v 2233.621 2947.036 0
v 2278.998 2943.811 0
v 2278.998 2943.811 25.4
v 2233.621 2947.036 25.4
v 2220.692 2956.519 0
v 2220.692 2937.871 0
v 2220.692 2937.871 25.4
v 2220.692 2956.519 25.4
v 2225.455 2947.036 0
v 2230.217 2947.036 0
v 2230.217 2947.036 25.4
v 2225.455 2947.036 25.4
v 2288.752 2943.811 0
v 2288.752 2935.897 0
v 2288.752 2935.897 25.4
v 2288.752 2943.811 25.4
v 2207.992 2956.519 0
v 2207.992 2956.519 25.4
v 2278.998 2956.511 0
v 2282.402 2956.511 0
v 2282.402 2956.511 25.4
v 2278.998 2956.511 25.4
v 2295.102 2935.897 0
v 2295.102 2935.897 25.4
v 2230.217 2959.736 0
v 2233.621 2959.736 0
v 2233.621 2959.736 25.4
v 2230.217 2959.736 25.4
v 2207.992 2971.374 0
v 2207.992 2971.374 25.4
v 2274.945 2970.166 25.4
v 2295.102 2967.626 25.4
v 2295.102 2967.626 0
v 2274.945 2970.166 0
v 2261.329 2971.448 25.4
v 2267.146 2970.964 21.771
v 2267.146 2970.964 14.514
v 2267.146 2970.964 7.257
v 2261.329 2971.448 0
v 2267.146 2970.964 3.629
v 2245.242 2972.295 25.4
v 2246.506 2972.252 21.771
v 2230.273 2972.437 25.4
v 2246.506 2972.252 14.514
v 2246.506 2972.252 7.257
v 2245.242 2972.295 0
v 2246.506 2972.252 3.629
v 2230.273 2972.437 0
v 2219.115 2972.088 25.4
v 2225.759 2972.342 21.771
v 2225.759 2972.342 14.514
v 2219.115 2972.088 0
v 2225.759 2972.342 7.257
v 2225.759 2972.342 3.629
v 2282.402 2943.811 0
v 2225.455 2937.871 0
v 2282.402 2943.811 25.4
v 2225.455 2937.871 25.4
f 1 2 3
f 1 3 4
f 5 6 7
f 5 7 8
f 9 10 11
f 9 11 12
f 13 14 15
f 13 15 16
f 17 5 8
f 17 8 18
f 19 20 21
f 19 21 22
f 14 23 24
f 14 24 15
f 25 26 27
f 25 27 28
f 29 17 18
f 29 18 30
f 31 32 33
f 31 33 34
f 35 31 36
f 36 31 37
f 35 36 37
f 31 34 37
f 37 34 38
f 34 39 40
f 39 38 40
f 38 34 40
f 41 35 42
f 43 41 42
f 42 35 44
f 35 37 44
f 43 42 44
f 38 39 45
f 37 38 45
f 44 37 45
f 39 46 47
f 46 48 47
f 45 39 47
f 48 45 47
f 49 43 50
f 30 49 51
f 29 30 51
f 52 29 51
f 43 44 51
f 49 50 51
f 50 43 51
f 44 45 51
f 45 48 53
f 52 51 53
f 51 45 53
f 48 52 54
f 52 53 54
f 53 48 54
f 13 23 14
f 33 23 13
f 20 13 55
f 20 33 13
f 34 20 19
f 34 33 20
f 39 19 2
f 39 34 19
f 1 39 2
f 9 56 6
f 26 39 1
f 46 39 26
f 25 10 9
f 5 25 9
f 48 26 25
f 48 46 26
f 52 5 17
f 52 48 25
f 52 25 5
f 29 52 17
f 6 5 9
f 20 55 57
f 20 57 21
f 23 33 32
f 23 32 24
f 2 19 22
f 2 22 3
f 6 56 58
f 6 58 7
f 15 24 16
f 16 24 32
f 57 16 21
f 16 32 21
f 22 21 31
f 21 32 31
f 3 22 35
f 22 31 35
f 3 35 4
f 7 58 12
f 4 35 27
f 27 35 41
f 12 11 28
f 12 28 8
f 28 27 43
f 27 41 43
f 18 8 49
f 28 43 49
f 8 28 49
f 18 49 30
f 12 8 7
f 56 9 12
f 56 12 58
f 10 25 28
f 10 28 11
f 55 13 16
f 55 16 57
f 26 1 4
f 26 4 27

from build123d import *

# Parameters (mm, degrees)
BOSS_EXTRUDE1_DEPTH = 25.4


with BuildPart() as part:
    # Sketch1 → Boss-Extrude1 (new body)
    with BuildSketch(Plane.XY):
        with BuildLine():
            Line((2220.692415066, 2956.519458786), (2207.992415066, 2956.519458786))
            Line((2207.992415066, 2956.519458786), (2207.992415066, 2971.373508056))
            add(Edge.make_bspline(
                [(2295.101715066, 2967.625549053), (2290.064424466, 2968.346081243), (2285.012310956, 2969.008222259), (2275.661688407, 2970.095859332), (2271.46891104, 2970.561992631), (2263.712580892, 2971.284066653), (2260.22175859, 2971.544191767), (2253.376045681, 2971.962739192), (2249.944376881, 2972.130760127), (2239.630606872, 2972.494910089), (2232.684433427, 2972.539406456), (2220.026077535, 2972.178011529), (2214.353563633, 2971.875813493), (2208.634622958, 2971.424716902), (2208.420612585, 2971.407836267), (2208.206537198, 2971.390747122), (2207.992415066, 2971.373508056)],
                knots=[8.102631096, 8.102631096, 8.102631096, 8.102631096, 8.693015228, 8.693015228, 9.188395438, 9.188395438, 9.581928848, 9.581928848, 9.975462257, 9.975462257, 10.762529077, 10.762529077, 11.414127093, 11.414127093, 11.414127093, 11.438510758, 11.438510758, 11.438510758, 11.438510758], degree=3))
            Line((2295.101715066, 2967.625549053), (2295.101715066, 2935.897056736))
            Line((2295.101715066, 2935.897056736), (2288.751715066, 2935.897056736))
            Line((2288.751715066, 2935.897056736), (2288.751715066, 2943.811183941))
            Line((2288.751715066, 2943.811183941), (2282.401715066, 2943.811183941))
            Line((2282.401715066, 2943.811183941), (2282.401715066, 2956.511183941))
            Line((2282.401715066, 2956.511183941), (2278.998115066, 2956.511183941))
            Line((2278.998115066, 2956.511183941), (2278.998115066, 2943.811183941))
            Line((2278.998115066, 2943.811183941), (2233.621015066, 2947.035979773))
            Line((2233.621015066, 2947.035979773), (2233.621015066, 2959.735979773))
            Line((2233.621015066, 2959.735979773), (2230.217415066, 2959.735979773))
            Line((2230.217415066, 2959.735979773), (2230.217415066, 2947.035979773))
            Line((2230.217415066, 2947.035979773), (2225.454915066, 2947.035979773))
            Line((2225.454915066, 2947.035979773), (2225.454915066, 2937.871351382))
            Line((2225.454915066, 2937.871351382), (2220.692415066, 2937.871351382))
            Line((2220.692415066, 2937.871351382), (2220.692415066, 2956.519458786))
        make_face()
    extrude(amount=BOSS_EXTRUDE1_DEPTH)


solid = part.part
